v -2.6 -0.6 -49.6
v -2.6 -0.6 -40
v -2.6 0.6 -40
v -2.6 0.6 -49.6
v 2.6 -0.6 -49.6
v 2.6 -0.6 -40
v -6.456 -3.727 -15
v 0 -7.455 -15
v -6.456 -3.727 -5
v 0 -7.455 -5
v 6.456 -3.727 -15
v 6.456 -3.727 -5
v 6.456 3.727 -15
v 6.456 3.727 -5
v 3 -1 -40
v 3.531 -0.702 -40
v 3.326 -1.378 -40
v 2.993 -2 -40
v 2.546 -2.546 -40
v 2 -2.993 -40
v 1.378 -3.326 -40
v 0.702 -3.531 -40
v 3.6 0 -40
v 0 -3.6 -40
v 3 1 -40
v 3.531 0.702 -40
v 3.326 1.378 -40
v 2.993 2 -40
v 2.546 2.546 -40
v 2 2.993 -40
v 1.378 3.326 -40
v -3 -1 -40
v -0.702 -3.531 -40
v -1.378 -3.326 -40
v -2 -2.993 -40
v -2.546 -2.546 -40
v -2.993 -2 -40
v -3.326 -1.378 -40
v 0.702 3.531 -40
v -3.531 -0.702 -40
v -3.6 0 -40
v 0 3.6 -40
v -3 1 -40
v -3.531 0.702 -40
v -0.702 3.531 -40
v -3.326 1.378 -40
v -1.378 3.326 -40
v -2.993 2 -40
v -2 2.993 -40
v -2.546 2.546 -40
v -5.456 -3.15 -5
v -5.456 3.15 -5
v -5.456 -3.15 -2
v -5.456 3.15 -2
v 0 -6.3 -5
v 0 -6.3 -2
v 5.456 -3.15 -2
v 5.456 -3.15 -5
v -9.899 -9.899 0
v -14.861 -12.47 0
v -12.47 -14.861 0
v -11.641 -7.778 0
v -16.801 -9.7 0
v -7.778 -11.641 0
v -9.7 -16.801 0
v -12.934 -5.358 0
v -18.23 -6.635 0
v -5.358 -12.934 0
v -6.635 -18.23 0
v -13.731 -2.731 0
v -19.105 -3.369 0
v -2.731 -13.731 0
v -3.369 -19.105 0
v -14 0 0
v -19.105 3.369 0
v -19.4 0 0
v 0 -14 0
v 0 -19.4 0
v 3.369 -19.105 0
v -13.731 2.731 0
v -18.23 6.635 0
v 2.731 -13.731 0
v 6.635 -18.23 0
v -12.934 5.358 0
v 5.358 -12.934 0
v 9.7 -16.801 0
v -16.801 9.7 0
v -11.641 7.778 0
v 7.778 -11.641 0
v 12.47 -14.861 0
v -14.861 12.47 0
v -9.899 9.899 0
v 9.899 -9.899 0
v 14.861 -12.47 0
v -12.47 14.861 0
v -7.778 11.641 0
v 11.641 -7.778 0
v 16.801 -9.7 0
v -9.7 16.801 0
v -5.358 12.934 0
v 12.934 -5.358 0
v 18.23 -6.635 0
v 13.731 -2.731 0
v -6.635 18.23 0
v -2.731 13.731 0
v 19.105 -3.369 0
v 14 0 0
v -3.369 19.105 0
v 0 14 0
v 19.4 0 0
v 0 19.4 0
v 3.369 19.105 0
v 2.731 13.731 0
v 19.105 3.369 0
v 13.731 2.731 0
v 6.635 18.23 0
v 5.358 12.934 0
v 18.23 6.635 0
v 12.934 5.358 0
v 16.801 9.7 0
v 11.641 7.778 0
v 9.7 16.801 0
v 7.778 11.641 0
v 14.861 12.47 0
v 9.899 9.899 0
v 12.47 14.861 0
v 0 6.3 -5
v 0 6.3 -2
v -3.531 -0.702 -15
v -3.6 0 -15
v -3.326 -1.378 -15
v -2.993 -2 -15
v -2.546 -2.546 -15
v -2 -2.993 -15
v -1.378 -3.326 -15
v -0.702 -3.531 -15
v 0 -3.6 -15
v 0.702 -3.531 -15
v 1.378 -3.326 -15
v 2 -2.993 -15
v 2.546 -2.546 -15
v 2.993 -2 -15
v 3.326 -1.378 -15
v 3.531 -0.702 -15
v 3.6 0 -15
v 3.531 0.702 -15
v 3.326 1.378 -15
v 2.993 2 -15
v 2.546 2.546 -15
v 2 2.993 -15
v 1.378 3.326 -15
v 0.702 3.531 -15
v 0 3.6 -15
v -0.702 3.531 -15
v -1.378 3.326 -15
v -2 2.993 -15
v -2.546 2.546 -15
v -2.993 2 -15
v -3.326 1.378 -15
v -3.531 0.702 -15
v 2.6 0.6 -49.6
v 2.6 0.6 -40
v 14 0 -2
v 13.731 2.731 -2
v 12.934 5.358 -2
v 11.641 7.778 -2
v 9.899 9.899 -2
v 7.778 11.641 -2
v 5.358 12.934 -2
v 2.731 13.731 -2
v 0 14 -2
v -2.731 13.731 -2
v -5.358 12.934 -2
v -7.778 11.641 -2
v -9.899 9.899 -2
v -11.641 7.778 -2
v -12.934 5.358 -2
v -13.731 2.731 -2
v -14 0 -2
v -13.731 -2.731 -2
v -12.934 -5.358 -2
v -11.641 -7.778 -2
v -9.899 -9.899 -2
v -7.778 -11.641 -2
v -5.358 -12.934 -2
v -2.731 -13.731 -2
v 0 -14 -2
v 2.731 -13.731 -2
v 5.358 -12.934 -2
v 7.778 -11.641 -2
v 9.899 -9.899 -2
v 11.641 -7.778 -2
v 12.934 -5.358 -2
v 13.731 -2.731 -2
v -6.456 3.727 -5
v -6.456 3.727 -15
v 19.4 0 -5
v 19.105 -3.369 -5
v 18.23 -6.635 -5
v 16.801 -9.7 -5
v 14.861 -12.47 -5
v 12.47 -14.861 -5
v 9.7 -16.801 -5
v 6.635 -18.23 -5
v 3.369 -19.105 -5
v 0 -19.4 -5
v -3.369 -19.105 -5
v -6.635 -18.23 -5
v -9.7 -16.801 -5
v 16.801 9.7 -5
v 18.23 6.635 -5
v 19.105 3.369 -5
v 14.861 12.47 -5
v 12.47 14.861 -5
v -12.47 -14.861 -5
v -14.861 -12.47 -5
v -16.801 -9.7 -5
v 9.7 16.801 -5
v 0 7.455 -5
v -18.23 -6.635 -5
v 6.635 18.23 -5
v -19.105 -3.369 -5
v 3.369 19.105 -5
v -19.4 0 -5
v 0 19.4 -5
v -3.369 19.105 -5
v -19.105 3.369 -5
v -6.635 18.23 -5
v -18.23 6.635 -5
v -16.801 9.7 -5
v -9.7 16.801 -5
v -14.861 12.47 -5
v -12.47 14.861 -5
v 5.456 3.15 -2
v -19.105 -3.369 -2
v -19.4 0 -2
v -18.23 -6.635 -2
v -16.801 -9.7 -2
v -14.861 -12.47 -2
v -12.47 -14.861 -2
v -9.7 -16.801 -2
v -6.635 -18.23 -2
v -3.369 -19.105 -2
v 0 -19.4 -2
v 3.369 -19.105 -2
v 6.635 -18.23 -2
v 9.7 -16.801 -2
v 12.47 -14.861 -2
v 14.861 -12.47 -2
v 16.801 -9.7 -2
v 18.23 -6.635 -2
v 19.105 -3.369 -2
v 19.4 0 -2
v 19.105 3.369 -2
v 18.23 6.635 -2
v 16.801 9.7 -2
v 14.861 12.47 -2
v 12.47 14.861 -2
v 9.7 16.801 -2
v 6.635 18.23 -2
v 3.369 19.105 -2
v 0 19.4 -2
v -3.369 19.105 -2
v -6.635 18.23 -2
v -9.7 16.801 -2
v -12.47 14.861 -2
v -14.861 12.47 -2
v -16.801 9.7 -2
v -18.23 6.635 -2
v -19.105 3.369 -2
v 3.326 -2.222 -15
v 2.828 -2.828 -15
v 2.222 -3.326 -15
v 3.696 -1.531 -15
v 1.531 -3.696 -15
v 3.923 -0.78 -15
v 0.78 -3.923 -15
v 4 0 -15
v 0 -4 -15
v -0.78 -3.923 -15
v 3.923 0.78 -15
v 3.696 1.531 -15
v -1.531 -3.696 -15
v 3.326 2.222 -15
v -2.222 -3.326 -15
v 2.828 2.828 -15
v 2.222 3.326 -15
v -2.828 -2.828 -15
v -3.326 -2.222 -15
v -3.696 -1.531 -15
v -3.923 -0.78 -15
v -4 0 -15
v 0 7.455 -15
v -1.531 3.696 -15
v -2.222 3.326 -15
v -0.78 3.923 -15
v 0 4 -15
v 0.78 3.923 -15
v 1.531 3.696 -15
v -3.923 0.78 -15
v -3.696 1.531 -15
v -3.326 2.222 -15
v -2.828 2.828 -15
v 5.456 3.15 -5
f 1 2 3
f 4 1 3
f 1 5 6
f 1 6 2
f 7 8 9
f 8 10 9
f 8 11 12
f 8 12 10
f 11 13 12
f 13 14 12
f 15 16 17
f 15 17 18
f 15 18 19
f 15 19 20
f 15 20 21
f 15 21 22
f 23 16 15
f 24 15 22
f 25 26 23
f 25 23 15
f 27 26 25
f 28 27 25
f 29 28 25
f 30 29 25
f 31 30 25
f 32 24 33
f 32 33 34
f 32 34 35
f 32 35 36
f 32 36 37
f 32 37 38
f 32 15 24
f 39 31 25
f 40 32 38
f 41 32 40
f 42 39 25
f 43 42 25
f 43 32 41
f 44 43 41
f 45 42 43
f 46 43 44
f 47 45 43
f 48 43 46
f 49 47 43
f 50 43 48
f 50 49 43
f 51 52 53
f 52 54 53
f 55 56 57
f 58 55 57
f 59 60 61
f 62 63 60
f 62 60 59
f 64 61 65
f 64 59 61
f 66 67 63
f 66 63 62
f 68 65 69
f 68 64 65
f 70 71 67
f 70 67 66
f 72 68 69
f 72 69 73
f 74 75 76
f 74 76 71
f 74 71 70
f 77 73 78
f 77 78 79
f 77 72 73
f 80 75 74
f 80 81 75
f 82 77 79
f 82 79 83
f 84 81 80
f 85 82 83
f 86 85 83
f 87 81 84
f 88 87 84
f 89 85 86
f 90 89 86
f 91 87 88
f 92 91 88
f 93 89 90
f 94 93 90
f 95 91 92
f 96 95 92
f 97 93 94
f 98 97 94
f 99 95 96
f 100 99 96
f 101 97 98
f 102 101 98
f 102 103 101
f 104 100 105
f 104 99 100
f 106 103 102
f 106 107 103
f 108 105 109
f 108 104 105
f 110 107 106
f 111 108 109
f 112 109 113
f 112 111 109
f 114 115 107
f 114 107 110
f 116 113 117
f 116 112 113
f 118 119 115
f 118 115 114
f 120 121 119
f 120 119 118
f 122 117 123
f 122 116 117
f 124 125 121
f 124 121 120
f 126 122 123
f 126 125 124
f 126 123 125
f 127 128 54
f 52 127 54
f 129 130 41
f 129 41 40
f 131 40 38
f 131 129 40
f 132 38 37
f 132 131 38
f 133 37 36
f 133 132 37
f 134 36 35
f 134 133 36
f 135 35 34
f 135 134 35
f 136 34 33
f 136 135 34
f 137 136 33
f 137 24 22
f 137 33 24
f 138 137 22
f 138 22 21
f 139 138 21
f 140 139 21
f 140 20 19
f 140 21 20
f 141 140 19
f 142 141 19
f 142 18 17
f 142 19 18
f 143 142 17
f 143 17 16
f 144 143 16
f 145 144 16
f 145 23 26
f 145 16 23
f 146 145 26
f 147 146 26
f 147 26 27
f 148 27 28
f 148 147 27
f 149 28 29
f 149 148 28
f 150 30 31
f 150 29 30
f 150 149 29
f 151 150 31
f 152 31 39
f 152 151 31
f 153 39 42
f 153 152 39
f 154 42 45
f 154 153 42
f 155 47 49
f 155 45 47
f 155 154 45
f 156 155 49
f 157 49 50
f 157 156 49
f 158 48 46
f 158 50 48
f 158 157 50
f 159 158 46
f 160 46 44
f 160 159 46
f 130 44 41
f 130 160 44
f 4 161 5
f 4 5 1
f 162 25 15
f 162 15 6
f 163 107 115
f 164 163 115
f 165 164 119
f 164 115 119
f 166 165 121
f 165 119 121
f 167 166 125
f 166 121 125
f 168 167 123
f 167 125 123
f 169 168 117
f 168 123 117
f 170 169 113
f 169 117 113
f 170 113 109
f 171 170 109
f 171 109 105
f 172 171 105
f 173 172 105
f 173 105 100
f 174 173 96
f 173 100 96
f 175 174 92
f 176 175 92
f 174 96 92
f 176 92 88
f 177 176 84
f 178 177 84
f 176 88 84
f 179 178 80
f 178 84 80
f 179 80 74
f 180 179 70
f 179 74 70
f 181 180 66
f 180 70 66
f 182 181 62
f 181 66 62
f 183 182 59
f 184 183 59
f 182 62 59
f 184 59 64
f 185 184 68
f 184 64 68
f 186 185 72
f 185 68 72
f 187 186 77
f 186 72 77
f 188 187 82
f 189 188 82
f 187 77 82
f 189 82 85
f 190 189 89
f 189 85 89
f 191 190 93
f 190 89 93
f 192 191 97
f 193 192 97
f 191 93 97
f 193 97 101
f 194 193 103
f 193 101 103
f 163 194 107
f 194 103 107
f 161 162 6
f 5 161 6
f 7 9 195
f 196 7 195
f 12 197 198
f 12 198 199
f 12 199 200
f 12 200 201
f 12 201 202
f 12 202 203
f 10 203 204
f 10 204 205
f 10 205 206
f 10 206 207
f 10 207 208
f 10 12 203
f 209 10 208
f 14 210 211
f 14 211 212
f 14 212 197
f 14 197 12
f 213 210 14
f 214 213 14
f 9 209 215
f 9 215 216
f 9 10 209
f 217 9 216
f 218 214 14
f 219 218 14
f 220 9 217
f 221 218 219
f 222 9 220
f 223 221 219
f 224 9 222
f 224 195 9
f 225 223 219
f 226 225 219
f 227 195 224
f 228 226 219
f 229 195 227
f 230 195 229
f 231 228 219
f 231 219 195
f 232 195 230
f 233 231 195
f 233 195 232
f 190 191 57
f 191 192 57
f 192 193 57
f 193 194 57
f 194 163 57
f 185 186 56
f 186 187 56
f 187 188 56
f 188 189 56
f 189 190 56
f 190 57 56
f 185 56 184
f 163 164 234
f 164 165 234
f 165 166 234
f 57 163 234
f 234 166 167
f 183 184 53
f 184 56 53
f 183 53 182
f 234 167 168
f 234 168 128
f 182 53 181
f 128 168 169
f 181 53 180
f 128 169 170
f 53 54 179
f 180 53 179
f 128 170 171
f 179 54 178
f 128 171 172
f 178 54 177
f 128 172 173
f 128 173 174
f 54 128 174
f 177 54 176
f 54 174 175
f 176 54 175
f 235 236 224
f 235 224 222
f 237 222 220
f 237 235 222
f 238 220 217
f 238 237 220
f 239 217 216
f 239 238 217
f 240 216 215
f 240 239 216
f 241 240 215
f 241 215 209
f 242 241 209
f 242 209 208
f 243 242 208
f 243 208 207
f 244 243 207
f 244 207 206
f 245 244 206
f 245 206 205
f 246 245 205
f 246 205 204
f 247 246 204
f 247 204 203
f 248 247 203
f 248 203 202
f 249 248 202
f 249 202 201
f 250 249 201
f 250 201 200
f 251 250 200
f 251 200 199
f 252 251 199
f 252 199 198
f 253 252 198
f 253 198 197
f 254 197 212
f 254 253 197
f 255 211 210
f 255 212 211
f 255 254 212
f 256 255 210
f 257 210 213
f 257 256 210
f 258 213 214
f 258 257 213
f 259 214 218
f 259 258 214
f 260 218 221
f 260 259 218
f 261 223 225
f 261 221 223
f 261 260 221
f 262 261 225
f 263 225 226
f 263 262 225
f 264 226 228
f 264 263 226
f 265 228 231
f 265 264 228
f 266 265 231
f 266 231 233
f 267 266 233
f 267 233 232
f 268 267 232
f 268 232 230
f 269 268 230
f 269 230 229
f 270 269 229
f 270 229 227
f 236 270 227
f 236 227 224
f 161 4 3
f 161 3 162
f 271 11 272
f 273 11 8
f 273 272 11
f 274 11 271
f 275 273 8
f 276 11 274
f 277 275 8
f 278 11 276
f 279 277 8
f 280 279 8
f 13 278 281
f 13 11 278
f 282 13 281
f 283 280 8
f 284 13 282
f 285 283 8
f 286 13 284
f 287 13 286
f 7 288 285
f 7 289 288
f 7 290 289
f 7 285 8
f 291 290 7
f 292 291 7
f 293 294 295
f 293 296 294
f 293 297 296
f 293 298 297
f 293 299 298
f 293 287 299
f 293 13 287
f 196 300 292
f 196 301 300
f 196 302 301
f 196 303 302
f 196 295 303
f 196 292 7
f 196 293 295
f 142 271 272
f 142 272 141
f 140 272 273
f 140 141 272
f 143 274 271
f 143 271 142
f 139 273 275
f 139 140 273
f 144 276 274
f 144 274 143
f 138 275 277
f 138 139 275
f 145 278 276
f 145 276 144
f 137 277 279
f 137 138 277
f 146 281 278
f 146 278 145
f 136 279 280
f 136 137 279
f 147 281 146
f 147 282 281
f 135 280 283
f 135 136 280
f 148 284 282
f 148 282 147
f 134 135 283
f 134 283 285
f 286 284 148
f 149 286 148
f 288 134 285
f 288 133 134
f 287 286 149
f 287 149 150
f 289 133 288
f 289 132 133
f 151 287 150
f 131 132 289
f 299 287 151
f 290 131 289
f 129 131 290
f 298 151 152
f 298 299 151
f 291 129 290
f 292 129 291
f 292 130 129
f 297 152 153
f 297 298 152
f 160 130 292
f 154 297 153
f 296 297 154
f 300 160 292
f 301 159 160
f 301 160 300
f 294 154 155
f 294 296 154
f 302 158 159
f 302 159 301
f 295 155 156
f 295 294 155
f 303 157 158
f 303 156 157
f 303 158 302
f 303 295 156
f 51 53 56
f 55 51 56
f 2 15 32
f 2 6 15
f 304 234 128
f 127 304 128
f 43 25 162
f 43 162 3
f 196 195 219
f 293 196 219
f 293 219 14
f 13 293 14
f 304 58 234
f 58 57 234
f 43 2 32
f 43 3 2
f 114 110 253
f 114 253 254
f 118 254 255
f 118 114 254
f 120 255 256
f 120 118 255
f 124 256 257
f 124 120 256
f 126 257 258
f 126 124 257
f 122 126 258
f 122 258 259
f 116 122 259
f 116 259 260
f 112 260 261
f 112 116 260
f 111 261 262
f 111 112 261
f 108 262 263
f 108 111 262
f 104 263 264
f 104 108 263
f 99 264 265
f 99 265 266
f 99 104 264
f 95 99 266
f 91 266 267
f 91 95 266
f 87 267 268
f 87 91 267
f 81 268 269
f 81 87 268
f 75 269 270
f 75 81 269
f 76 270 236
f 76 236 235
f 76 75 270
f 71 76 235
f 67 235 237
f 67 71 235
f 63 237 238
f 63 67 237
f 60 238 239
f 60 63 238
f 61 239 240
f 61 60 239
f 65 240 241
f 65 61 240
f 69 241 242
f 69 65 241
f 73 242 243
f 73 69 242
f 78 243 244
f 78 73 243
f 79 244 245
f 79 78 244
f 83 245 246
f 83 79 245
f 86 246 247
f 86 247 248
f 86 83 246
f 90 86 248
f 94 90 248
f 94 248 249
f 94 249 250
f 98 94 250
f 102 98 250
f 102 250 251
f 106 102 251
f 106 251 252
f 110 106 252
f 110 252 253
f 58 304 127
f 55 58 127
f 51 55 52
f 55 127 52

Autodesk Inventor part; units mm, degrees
sketch "Sketch1" plane through (0, 0, 0) normal (0, 0, 1) x (1, 0, 0)
  circle A0 centre (0, 0) radius 19.4
  circle A1 centre (0, 0) radius 14
  dimension "d0" = 38.8
  dimension "d1" = 28
extrude "Extrusion1" add sketch "Sketch1" against normal blind 2
ref_plane "Work Plane1" through (-19.6075, -25, -15) normal (0, 0, 1) x (1, 0, 0)
ref_plane "Work Plane2" through (-137.3725, -100, -40) normal (0, 0, -1) x (0, 1, 0)
sketch "Sketch5" plane through (0, 0, -2) normal (0, 0, -1) x (-1, 0, 0)
  circle A0 centre (0, 0) radius 19.4 projected
  line L0 (-5.456, -3.15) -> (-5.456, 3.15)
  line L1 (-5.456, 3.15) -> (0, 6.3)
  line L2 (0, 6.3) -> (5.456, 3.15)
  line L3 (5.456, 3.15) -> (5.456, -3.15)
  line L4 (5.456, -3.15) -> (0, -6.3)
  line L5 (0, -6.3) -> (-5.456, -3.15)
  dimension "d14" = 6.3
extrude "Extrusion5" add sketch "Sketch5" along normal blind 3
sketch "Sketch6" plane through (0, 0, -5) normal (0, 0, -1) x (-1, 0, 0)
  circle A0 centre (0, 0) radius 19.4 projected
  line L0 (-5.456, -3.15) -> (-5.456, 3.15) projected
  line L1 (-5.456, 3.15) -> (0, 6.3) projected
  line L2 (0, 6.3) -> (5.456, 3.15) projected
  line L3 (5.456, 3.15) -> (5.456, -3.15) projected
  line L4 (5.456, -3.15) -> (0, -6.3) projected
  line L5 (0, -6.3) -> (-5.456, -3.15) projected
  line L6 (-6.456, 3.7274) -> (-6.456, -3.7274)
  line L7 (-6.456, -3.7274) -> (0, -7.4547)
  line L8 (0, -7.4547) -> (6.456, -3.7274)
  line L9 (6.456, -3.7274) -> (6.456, 3.7274)
  line L10 (6.456, 3.7274) -> (0, 7.4547)
  line L11 (0, 7.4547) -> (-6.456, 3.7274)
  dimension "d17" = 1
ref_plane "Work Plane3" through (-19.6075, -25, -15) normal (0, 0, 1) x (1, 0, 0)
extrude "Extrusion6" add sketch "Sketch6" along normal up to surface (10 mm away) contours L0 L1 L2 L3 L4 L5 | L11 L10 L9 L8 L7 L6
sketch "Sketch7" plane through (6.456, -3.7274, -15) normal (0, 0, -1) x (-1, 0, 0)
  circle A0 centre (6.456, 3.7274) radius 4
  dimension "d20" = 8
ref_plane "Work Plane4" through (-137.3725, -100, -40) normal (0, 0, -1) x (0, 1, 0)
extrude "Extrusion7" add sketch "Sketch7" along normal up to surface (25 mm away)
sketch "Sketch8" plane through (0, 0, -40) normal (0, 0, -1) x (-1, 0, 0)
  line L0 (-3, -1) -> (3, -1)
  line L1 (3, -1) -> (3, 1)
  line L2 (3, 1) -> (-3, 1)
  line L3 (-3, 1) -> (-3, -1)
  line L4 (-3, -1) -> (3, 1) construction
  line L5 (3, -1) -> (-3, 1) construction
  point P0 (0, 0)
  dimension "d23" = 6
  dimension "d24" = 2
extrude "Extrusion8" add sketch "Sketch8" along normal blind 10
thicken "Thicken1" operation cut thickness 0.4 both sides no extend neighbours no toward (0.9870503, 0.1604113, 0) faces at (-3.9482, -0.6416, -31.6667)
thicken "Thicken2" operation cut thickness 0.4 both sides no extend neighbours no toward (1, 0, 0) faces at (-3, -0.3333, -46.6667) (-1, 1, -43.3333) (3, 0.3333, -46.6667) (1, -1, -43.3333) (-1, -0.3333, -50)
properties part number "Reverser_print"
